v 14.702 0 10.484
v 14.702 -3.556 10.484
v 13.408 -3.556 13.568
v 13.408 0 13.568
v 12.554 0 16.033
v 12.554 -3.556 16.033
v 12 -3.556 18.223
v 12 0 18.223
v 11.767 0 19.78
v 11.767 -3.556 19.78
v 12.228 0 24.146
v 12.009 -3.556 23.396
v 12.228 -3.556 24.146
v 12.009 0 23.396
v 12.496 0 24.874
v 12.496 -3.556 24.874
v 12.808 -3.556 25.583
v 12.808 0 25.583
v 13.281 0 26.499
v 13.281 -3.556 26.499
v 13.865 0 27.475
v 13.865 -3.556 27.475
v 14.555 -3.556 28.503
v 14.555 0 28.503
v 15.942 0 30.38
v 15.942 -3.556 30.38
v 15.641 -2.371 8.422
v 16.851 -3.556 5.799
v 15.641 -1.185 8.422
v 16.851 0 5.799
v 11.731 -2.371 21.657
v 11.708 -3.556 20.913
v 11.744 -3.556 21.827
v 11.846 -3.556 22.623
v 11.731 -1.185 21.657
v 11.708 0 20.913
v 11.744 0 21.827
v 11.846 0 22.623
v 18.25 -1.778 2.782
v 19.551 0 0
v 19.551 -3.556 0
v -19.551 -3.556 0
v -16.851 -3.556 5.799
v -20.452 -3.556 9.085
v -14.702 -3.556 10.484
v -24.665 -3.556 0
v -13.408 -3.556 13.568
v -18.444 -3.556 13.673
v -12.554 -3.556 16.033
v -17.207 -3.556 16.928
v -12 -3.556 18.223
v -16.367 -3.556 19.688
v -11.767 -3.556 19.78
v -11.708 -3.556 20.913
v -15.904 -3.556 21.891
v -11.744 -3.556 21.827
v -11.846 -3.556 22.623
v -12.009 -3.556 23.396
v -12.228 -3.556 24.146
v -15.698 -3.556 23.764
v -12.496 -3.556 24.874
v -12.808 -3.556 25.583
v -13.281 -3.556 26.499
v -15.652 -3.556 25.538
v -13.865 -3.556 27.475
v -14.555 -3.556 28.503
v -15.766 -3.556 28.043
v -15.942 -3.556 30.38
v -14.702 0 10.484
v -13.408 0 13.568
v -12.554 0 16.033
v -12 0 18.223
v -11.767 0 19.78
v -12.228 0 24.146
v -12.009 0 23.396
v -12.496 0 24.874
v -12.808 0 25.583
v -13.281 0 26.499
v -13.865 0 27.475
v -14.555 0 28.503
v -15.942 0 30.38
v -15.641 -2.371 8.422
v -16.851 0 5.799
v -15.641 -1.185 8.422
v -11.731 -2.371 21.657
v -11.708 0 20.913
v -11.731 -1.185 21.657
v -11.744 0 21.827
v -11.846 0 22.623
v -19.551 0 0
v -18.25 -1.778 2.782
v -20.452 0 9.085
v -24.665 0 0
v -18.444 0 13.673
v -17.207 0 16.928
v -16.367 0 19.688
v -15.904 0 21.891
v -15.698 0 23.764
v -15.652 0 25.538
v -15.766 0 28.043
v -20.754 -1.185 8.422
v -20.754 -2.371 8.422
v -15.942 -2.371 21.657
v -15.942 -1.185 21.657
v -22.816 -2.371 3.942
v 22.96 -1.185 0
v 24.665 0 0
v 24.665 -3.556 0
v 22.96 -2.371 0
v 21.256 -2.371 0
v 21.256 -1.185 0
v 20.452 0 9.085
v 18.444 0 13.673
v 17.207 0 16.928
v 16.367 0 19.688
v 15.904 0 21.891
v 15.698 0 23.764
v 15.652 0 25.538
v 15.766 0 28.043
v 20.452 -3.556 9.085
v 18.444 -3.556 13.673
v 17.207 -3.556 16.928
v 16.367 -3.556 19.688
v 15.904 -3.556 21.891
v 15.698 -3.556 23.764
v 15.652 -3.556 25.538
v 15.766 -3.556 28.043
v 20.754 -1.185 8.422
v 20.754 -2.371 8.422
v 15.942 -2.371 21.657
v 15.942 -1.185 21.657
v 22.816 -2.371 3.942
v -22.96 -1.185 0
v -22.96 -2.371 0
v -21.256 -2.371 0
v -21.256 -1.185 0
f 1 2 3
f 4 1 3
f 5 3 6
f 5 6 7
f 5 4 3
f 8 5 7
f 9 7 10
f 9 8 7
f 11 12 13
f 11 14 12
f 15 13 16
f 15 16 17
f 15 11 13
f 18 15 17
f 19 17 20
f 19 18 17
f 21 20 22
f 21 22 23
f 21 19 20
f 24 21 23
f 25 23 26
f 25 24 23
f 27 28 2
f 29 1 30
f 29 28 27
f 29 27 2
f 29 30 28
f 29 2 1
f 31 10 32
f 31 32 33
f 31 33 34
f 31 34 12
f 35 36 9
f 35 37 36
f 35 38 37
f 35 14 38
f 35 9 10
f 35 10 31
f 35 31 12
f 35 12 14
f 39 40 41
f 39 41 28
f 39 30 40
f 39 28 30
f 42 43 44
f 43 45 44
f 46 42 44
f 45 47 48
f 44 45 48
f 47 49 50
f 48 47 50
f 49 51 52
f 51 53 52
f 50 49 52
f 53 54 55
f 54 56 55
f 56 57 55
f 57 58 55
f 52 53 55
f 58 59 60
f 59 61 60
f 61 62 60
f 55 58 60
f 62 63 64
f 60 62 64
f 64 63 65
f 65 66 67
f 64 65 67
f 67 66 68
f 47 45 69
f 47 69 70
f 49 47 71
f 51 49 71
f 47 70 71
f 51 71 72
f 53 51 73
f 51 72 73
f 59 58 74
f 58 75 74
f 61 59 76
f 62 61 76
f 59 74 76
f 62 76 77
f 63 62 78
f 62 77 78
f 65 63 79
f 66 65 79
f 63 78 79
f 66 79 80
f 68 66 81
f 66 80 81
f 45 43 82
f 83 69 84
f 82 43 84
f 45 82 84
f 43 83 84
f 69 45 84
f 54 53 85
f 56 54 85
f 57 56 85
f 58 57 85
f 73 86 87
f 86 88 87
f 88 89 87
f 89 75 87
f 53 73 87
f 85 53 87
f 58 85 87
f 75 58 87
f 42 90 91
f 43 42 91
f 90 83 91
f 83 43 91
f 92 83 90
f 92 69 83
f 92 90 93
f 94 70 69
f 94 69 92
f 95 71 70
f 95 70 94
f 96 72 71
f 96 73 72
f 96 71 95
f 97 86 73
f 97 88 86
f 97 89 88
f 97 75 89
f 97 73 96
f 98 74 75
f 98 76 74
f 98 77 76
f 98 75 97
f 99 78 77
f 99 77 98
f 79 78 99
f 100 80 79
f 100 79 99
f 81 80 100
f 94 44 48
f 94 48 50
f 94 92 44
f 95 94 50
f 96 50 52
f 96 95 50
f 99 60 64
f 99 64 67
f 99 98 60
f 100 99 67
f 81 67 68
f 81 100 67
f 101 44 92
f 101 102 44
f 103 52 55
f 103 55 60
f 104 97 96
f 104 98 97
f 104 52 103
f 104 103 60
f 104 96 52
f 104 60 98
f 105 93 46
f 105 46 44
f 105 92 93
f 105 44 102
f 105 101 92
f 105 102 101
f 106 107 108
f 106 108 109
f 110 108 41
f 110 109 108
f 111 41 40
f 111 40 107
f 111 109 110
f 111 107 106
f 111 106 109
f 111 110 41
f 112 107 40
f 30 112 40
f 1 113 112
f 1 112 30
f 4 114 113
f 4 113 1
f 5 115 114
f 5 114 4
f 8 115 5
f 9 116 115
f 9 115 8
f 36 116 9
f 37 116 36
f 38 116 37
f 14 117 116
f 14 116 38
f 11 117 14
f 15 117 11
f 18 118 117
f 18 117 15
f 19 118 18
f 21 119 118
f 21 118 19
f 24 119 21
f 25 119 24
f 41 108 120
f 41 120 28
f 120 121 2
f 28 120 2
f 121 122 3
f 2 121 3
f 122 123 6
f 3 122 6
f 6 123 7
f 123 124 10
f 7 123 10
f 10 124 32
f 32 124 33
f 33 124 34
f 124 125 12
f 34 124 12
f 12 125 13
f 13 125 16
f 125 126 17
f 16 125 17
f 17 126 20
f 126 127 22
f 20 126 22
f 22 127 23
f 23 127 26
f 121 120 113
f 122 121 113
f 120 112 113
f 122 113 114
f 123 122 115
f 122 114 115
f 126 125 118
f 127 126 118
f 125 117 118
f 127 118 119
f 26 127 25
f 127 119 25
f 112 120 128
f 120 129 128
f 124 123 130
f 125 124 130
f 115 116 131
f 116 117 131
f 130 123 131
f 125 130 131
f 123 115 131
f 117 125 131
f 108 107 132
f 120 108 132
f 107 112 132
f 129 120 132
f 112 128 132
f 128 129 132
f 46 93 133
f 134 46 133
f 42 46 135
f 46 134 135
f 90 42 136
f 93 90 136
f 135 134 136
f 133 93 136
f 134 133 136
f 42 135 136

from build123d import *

# Parameters (mm, degrees)
F1_DEPTH = 3.556


with BuildPart() as f1:
    # F0 (on Front) → F1 (new body)
    with BuildSketch(Plane.XZ):
        with BuildLine():
            add(Edge.make_bspline(
                [(-24.6647372842, 0), (-23.4565678995, 2.5443287289), (-20.7546127973, 8.3797450547), (-14.8759715948, 21.3762612389), (-15.7761463108, 27.8073529341), (-15.9418433905, 30.3797386587)],
                knots=[0, 0, 0, 0, 0.3124282727, 0.6971858871, 1, 1, 1, 1], degree=3))
            add(Edge.make_bspline(
                [(-24.6647372842, 0), (-22.9602636149, 0), (-21.2557899455, 0), (-19.5513162762, 0)],
                knots=[0, 0, 0, 0, 5.113421008, 5.113421008, 5.113421008, 5.113421008], degree=3))
            add(Edge.make_bspline(
                [(-19.5513162762, 0), (-18.3654232373, 2.5223862294), (-15.6993630667, 8.2784864085), (-9.494077625, 21.8033298283), (-14.0371485402, 27.871922481), (-15.9418433905, 30.3797386587)],
                knots=[0, 0, 0, 0, 0.3085996873, 0.6848139653, 1, 1, 1, 1], degree=3))
        make_face()
    extrude(amount=F1_DEPTH)


with BuildPart() as f1b:
    # F0 (on Front) → F1, piece 2 (new body)
    with BuildSketch(Plane.XZ):
        with BuildLine():
            add(Edge.make_bspline(
                [(19.5513162762, 0), (18.3654232373, 2.5223862294), (15.6993630667, 8.2784864085), (9.494077625, 21.8033298283), (14.0371485402, 27.871922481), (15.9418433905, 30.3797386587)],
                knots=[0, 0, 0, 0, 0.3085996873, 0.6848139653, 1, 1, 1, 1], degree=3))
            add(Edge.make_bspline(
                [(24.6647372842, 0), (22.9602636149, 0), (21.2557899455, 0), (19.5513162762, 0)],
                knots=[0, 0, 0, 0, 5.113421008, 5.113421008, 5.113421008, 5.113421008], degree=3))
            add(Edge.make_bspline(
                [(24.6647372842, 0), (23.4565678995, 2.5443287289), (20.7546127973, 8.3797450547), (14.8759715948, 21.3762612389), (15.7761463108, 27.8073529341), (15.9418433905, 30.3797386587)],
                knots=[0, 0, 0, 0, 0.3124282727, 0.6971858871, 1, 1, 1, 1], degree=3))
        make_face()
    extrude(amount=F1_DEPTH)


solid = Compound([f1.part, f1b.part])
